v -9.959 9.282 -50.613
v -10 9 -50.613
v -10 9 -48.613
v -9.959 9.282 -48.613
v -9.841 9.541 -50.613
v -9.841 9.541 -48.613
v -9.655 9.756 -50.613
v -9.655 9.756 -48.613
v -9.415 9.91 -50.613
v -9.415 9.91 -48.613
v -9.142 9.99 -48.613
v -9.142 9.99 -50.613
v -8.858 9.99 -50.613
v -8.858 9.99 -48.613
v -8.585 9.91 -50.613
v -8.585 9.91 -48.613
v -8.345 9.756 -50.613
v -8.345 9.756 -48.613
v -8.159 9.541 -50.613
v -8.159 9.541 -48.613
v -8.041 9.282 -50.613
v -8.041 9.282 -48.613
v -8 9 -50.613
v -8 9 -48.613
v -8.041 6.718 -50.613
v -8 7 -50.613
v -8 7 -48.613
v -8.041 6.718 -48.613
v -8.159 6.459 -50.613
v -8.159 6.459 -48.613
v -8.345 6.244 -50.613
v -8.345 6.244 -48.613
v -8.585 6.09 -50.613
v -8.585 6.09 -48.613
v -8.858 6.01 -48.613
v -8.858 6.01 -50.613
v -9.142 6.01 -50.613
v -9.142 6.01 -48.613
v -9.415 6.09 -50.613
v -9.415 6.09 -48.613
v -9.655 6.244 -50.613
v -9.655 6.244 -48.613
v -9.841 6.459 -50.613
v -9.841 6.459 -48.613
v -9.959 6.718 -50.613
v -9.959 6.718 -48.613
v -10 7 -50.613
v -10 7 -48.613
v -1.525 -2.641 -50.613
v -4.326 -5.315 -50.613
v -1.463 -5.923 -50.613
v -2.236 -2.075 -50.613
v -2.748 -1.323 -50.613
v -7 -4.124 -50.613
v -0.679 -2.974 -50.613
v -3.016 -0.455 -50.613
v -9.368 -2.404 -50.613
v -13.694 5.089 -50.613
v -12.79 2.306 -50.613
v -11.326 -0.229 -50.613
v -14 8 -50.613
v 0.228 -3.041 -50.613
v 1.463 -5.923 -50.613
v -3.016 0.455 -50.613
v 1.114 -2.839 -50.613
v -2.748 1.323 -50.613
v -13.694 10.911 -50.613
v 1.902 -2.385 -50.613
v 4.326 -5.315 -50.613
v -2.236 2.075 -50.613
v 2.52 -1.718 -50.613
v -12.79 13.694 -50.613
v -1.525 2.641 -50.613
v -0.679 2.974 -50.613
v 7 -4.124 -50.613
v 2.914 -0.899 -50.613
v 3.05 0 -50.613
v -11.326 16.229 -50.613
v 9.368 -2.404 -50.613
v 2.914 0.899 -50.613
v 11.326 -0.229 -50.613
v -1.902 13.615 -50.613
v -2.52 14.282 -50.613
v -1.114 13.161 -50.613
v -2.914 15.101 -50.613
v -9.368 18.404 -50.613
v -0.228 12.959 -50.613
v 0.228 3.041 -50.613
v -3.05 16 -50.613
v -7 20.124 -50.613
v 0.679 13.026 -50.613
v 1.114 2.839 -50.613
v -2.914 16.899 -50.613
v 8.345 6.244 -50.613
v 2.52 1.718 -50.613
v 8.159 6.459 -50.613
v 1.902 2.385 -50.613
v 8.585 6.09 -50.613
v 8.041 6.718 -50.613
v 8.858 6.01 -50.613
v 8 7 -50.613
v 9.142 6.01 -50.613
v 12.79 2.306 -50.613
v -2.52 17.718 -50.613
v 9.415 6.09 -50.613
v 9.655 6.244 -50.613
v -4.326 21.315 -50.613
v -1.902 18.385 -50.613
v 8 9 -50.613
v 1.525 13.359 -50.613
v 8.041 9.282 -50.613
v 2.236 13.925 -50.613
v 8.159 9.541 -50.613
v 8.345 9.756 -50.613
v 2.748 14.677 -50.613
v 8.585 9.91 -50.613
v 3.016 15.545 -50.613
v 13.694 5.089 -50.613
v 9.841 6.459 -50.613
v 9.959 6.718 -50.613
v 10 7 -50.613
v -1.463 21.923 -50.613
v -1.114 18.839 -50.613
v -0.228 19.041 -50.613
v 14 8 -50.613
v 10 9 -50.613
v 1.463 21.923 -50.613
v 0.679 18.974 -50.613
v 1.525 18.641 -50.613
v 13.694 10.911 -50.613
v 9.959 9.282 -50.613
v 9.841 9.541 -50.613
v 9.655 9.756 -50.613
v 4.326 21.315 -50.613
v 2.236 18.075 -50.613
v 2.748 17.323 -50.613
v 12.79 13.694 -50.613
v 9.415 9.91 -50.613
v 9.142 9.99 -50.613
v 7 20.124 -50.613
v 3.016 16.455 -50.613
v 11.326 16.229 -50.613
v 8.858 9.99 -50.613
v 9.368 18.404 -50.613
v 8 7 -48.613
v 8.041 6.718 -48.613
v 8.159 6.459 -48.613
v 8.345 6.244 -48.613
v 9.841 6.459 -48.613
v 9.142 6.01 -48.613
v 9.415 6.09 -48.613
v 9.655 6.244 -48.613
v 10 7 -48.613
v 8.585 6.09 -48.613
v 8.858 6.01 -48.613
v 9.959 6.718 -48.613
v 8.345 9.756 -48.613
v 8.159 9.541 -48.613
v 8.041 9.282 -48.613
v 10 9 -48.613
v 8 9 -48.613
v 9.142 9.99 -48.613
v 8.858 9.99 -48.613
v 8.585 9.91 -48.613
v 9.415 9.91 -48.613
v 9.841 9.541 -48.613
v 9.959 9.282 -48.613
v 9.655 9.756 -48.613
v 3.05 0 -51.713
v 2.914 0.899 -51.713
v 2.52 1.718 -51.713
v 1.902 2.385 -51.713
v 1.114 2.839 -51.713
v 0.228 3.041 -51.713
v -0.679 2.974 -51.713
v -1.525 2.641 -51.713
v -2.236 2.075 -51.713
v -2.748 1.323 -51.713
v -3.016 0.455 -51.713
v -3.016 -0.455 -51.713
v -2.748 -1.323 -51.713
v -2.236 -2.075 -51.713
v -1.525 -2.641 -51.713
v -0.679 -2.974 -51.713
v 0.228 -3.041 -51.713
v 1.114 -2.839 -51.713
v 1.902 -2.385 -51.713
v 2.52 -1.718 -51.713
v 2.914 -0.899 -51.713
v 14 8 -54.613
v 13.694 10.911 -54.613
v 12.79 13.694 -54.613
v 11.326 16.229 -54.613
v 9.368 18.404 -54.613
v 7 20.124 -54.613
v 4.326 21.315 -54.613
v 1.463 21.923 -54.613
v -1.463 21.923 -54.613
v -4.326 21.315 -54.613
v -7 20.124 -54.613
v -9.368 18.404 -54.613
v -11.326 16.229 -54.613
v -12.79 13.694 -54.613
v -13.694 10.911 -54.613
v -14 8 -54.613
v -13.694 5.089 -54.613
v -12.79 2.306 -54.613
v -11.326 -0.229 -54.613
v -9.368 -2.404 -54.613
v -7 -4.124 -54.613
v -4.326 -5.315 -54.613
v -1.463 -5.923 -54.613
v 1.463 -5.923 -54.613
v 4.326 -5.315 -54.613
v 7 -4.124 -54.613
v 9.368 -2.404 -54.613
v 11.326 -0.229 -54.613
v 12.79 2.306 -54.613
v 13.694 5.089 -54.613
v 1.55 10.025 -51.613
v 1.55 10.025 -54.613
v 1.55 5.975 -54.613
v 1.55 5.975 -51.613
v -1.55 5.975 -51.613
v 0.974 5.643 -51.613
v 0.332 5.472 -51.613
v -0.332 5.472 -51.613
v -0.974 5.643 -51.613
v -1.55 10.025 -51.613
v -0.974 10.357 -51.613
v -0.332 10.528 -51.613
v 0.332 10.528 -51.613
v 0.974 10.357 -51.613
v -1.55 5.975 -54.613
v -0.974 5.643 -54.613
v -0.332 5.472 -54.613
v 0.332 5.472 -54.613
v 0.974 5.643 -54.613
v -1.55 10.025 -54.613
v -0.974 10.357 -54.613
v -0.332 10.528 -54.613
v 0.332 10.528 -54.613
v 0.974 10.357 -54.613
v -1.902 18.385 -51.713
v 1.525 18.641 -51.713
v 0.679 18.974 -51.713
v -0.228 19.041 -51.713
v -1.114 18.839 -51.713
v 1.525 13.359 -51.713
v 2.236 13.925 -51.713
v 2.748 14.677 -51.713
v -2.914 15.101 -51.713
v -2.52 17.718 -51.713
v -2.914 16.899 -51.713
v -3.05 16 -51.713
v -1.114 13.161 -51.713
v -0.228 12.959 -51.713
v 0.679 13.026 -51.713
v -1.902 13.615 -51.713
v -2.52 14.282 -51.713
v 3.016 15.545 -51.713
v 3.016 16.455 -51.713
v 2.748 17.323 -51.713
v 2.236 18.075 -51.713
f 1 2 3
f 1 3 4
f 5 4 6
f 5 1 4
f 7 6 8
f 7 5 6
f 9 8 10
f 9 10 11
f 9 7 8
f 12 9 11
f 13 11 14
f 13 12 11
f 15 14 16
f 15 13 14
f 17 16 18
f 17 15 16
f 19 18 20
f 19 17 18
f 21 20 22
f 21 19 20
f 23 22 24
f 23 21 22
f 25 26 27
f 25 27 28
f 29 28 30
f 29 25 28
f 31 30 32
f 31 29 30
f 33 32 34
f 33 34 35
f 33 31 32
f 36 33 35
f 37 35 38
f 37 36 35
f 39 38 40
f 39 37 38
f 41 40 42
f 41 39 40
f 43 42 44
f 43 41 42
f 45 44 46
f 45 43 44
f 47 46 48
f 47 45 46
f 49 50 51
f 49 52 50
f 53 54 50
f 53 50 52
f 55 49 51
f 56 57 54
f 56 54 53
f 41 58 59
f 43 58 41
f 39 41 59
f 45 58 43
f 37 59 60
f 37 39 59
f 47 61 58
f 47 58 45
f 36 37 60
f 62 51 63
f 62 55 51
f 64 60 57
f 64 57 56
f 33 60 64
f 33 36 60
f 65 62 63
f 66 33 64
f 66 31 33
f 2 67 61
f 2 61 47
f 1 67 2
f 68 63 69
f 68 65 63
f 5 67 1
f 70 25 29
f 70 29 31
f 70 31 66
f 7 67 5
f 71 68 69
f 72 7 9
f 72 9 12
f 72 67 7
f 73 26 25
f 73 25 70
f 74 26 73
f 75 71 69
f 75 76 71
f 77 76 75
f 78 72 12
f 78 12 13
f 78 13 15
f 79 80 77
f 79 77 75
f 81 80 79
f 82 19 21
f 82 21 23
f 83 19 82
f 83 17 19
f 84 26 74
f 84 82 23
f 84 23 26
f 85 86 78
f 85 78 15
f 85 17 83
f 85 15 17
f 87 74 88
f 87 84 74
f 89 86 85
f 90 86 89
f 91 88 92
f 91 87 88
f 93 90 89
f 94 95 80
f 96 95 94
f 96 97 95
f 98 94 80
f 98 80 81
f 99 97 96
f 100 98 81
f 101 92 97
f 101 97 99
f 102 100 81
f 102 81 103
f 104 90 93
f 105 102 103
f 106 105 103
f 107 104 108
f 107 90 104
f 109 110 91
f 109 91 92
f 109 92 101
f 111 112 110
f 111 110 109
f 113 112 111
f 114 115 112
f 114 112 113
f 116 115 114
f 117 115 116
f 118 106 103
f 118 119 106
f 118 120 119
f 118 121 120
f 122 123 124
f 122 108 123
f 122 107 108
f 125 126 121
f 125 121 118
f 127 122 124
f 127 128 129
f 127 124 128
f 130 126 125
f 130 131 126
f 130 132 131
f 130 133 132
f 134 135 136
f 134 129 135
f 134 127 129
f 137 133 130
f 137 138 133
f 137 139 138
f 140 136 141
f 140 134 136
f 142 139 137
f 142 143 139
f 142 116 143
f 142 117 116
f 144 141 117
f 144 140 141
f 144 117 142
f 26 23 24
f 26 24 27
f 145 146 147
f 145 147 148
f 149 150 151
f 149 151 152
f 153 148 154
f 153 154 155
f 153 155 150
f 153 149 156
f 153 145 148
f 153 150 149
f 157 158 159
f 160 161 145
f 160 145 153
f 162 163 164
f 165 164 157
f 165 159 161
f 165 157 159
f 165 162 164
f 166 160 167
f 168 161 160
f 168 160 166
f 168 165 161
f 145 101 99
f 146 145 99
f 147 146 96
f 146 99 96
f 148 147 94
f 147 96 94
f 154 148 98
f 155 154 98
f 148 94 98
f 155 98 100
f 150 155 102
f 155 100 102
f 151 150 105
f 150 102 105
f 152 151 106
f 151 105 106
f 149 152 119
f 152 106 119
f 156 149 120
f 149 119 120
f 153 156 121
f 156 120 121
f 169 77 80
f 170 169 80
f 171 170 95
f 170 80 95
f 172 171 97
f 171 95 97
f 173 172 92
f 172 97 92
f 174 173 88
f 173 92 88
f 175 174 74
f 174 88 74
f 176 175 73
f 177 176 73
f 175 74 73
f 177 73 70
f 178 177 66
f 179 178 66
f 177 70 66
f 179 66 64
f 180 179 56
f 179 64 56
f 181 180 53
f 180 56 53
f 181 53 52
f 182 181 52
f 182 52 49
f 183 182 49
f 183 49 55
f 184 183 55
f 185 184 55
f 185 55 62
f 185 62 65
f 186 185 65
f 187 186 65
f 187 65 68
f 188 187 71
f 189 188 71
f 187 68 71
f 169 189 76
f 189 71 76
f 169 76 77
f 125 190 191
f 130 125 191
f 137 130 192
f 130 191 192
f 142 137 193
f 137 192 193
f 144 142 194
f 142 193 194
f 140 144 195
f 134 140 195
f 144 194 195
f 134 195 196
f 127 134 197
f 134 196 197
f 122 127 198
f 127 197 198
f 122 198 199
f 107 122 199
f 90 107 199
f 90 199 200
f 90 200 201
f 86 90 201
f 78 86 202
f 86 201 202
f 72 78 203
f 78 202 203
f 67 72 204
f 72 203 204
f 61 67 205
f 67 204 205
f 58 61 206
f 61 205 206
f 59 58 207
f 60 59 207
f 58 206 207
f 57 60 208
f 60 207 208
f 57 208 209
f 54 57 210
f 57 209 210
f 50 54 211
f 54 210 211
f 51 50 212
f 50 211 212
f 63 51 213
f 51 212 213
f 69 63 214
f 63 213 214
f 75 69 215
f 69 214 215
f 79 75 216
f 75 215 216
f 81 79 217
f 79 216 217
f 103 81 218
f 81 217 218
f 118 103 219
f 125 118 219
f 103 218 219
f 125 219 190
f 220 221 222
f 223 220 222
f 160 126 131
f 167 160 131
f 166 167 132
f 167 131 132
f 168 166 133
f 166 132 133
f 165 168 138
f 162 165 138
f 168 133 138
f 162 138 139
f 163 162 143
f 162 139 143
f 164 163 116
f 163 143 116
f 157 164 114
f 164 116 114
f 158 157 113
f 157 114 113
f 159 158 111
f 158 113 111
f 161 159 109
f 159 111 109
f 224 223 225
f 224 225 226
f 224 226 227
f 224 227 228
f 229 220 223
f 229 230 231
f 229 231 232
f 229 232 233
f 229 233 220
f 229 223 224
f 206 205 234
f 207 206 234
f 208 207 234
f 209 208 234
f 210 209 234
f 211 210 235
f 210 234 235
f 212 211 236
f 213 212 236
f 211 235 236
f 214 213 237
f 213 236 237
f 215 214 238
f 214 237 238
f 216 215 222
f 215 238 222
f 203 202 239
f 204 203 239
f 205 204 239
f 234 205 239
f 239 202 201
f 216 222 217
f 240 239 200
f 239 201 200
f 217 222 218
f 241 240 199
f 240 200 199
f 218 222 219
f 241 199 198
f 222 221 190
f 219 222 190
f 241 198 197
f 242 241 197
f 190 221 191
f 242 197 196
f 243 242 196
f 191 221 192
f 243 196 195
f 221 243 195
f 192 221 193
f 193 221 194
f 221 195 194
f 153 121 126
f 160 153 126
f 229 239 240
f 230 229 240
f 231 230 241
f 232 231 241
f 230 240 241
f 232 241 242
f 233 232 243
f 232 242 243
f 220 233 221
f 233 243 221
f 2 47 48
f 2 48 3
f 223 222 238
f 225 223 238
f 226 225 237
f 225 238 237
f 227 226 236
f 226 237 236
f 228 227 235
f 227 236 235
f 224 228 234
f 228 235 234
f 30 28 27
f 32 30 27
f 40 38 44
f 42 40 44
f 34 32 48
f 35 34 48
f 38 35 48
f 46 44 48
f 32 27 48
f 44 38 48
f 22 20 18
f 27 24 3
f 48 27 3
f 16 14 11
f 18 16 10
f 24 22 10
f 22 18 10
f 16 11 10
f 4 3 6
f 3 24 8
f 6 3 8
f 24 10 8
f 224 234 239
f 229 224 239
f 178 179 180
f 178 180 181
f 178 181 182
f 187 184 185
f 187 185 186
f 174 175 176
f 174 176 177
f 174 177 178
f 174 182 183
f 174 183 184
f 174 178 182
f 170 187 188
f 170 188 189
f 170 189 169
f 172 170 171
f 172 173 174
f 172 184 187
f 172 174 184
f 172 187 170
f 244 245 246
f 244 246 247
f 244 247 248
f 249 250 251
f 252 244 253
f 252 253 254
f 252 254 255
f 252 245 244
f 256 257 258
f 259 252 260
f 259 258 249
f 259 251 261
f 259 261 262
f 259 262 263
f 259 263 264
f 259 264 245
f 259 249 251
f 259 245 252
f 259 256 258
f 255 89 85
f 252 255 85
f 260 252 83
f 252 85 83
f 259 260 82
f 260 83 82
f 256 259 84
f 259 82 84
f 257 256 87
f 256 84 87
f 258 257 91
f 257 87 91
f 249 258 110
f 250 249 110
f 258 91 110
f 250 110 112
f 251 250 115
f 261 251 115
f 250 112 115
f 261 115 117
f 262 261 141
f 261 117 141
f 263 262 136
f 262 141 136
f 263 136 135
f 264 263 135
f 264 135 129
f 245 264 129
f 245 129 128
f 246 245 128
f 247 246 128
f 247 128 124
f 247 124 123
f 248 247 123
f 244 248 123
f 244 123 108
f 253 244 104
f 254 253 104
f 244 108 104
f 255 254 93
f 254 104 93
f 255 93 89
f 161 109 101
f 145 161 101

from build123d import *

# Parameters (mm, degrees)
BOSS_EXTRUDE1_DEPTH      = 1
BOSS_EXTRUDE1_DEPTH_BACK = 3
SKETCH3_R                = 14
SKETCH6_R                = 3.05
CUT_EXTRUDE2_DEPTH       = 1.1
BOSS_EXTRUDE2_DEPTH      = 2
CUT_EXTRUDE3_DEPTH       = 3


with BuildPart() as part:
    # Sketch3 → Boss-Extrude1 (new, two sides: drawn at the far end of the back side and taken through both)
    with BuildSketch(Plane.XY.offset(-51.612811659).offset(-BOSS_EXTRUDE1_DEPTH_BACK)):
        with Locations((0, 8)):
            Circle(SKETCH3_R)
    extrude(amount=BOSS_EXTRUDE1_DEPTH + BOSS_EXTRUDE1_DEPTH_BACK)

    # Sketch6 → Cut-Extrude2 (cut)
    with BuildSketch(Plane.XY.offset(-50.612811659)):
        Circle(SKETCH6_R)
        with Locations(Location((0, 16, 0), (0, 0, 180))):
            Circle(SKETCH6_R)
    extrude(amount=-CUT_EXTRUDE2_DEPTH, mode=Mode.SUBTRACT)

    # Sketch7 → Boss-Extrude2 (add)
    with BuildSketch(Plane.XY.offset(-50.612811659)):
        with BuildLine():
            Line((-8, 9), (-8, 7))
            ThreePointArc((-8, 7), (-9, 6), (-10, 7))
            Line((-10, 7), (-10, 9))
            ThreePointArc((-10, 9), (-9, 10), (-8, 9))
        make_face()
        with BuildLine():
            Line((8, 9), (8, 7))
            ThreePointArc((8, 7), (9, 6), (10, 7))
            Line((10, 7), (10, 9))
            ThreePointArc((10, 9), (9, 10), (8, 9))
        make_face()
    extrude(amount=BOSS_EXTRUDE2_DEPTH)

    # Sketch8 → Cut-Extrude3 (cut)
    with BuildSketch(Plane(origin=(0, 0, -54.612811659), x_dir=(-1, 0, 0), z_dir=(0, 0, -1))):
        with BuildLine():
            Line((-1.55, 10.024845673), (-1.55, 5.975154327))
            ThreePointArc((-1.55, 5.975154327), (0, 5.45), (1.55, 5.975154327))
            Line((1.55, 5.975154327), (1.55, 10.024845673))
            ThreePointArc((1.55, 10.024845673), (0, 10.55), (-1.55, 10.024845673))
        make_face()
    extrude(amount=-CUT_EXTRUDE3_DEPTH, mode=Mode.SUBTRACT)


solid = part.part
